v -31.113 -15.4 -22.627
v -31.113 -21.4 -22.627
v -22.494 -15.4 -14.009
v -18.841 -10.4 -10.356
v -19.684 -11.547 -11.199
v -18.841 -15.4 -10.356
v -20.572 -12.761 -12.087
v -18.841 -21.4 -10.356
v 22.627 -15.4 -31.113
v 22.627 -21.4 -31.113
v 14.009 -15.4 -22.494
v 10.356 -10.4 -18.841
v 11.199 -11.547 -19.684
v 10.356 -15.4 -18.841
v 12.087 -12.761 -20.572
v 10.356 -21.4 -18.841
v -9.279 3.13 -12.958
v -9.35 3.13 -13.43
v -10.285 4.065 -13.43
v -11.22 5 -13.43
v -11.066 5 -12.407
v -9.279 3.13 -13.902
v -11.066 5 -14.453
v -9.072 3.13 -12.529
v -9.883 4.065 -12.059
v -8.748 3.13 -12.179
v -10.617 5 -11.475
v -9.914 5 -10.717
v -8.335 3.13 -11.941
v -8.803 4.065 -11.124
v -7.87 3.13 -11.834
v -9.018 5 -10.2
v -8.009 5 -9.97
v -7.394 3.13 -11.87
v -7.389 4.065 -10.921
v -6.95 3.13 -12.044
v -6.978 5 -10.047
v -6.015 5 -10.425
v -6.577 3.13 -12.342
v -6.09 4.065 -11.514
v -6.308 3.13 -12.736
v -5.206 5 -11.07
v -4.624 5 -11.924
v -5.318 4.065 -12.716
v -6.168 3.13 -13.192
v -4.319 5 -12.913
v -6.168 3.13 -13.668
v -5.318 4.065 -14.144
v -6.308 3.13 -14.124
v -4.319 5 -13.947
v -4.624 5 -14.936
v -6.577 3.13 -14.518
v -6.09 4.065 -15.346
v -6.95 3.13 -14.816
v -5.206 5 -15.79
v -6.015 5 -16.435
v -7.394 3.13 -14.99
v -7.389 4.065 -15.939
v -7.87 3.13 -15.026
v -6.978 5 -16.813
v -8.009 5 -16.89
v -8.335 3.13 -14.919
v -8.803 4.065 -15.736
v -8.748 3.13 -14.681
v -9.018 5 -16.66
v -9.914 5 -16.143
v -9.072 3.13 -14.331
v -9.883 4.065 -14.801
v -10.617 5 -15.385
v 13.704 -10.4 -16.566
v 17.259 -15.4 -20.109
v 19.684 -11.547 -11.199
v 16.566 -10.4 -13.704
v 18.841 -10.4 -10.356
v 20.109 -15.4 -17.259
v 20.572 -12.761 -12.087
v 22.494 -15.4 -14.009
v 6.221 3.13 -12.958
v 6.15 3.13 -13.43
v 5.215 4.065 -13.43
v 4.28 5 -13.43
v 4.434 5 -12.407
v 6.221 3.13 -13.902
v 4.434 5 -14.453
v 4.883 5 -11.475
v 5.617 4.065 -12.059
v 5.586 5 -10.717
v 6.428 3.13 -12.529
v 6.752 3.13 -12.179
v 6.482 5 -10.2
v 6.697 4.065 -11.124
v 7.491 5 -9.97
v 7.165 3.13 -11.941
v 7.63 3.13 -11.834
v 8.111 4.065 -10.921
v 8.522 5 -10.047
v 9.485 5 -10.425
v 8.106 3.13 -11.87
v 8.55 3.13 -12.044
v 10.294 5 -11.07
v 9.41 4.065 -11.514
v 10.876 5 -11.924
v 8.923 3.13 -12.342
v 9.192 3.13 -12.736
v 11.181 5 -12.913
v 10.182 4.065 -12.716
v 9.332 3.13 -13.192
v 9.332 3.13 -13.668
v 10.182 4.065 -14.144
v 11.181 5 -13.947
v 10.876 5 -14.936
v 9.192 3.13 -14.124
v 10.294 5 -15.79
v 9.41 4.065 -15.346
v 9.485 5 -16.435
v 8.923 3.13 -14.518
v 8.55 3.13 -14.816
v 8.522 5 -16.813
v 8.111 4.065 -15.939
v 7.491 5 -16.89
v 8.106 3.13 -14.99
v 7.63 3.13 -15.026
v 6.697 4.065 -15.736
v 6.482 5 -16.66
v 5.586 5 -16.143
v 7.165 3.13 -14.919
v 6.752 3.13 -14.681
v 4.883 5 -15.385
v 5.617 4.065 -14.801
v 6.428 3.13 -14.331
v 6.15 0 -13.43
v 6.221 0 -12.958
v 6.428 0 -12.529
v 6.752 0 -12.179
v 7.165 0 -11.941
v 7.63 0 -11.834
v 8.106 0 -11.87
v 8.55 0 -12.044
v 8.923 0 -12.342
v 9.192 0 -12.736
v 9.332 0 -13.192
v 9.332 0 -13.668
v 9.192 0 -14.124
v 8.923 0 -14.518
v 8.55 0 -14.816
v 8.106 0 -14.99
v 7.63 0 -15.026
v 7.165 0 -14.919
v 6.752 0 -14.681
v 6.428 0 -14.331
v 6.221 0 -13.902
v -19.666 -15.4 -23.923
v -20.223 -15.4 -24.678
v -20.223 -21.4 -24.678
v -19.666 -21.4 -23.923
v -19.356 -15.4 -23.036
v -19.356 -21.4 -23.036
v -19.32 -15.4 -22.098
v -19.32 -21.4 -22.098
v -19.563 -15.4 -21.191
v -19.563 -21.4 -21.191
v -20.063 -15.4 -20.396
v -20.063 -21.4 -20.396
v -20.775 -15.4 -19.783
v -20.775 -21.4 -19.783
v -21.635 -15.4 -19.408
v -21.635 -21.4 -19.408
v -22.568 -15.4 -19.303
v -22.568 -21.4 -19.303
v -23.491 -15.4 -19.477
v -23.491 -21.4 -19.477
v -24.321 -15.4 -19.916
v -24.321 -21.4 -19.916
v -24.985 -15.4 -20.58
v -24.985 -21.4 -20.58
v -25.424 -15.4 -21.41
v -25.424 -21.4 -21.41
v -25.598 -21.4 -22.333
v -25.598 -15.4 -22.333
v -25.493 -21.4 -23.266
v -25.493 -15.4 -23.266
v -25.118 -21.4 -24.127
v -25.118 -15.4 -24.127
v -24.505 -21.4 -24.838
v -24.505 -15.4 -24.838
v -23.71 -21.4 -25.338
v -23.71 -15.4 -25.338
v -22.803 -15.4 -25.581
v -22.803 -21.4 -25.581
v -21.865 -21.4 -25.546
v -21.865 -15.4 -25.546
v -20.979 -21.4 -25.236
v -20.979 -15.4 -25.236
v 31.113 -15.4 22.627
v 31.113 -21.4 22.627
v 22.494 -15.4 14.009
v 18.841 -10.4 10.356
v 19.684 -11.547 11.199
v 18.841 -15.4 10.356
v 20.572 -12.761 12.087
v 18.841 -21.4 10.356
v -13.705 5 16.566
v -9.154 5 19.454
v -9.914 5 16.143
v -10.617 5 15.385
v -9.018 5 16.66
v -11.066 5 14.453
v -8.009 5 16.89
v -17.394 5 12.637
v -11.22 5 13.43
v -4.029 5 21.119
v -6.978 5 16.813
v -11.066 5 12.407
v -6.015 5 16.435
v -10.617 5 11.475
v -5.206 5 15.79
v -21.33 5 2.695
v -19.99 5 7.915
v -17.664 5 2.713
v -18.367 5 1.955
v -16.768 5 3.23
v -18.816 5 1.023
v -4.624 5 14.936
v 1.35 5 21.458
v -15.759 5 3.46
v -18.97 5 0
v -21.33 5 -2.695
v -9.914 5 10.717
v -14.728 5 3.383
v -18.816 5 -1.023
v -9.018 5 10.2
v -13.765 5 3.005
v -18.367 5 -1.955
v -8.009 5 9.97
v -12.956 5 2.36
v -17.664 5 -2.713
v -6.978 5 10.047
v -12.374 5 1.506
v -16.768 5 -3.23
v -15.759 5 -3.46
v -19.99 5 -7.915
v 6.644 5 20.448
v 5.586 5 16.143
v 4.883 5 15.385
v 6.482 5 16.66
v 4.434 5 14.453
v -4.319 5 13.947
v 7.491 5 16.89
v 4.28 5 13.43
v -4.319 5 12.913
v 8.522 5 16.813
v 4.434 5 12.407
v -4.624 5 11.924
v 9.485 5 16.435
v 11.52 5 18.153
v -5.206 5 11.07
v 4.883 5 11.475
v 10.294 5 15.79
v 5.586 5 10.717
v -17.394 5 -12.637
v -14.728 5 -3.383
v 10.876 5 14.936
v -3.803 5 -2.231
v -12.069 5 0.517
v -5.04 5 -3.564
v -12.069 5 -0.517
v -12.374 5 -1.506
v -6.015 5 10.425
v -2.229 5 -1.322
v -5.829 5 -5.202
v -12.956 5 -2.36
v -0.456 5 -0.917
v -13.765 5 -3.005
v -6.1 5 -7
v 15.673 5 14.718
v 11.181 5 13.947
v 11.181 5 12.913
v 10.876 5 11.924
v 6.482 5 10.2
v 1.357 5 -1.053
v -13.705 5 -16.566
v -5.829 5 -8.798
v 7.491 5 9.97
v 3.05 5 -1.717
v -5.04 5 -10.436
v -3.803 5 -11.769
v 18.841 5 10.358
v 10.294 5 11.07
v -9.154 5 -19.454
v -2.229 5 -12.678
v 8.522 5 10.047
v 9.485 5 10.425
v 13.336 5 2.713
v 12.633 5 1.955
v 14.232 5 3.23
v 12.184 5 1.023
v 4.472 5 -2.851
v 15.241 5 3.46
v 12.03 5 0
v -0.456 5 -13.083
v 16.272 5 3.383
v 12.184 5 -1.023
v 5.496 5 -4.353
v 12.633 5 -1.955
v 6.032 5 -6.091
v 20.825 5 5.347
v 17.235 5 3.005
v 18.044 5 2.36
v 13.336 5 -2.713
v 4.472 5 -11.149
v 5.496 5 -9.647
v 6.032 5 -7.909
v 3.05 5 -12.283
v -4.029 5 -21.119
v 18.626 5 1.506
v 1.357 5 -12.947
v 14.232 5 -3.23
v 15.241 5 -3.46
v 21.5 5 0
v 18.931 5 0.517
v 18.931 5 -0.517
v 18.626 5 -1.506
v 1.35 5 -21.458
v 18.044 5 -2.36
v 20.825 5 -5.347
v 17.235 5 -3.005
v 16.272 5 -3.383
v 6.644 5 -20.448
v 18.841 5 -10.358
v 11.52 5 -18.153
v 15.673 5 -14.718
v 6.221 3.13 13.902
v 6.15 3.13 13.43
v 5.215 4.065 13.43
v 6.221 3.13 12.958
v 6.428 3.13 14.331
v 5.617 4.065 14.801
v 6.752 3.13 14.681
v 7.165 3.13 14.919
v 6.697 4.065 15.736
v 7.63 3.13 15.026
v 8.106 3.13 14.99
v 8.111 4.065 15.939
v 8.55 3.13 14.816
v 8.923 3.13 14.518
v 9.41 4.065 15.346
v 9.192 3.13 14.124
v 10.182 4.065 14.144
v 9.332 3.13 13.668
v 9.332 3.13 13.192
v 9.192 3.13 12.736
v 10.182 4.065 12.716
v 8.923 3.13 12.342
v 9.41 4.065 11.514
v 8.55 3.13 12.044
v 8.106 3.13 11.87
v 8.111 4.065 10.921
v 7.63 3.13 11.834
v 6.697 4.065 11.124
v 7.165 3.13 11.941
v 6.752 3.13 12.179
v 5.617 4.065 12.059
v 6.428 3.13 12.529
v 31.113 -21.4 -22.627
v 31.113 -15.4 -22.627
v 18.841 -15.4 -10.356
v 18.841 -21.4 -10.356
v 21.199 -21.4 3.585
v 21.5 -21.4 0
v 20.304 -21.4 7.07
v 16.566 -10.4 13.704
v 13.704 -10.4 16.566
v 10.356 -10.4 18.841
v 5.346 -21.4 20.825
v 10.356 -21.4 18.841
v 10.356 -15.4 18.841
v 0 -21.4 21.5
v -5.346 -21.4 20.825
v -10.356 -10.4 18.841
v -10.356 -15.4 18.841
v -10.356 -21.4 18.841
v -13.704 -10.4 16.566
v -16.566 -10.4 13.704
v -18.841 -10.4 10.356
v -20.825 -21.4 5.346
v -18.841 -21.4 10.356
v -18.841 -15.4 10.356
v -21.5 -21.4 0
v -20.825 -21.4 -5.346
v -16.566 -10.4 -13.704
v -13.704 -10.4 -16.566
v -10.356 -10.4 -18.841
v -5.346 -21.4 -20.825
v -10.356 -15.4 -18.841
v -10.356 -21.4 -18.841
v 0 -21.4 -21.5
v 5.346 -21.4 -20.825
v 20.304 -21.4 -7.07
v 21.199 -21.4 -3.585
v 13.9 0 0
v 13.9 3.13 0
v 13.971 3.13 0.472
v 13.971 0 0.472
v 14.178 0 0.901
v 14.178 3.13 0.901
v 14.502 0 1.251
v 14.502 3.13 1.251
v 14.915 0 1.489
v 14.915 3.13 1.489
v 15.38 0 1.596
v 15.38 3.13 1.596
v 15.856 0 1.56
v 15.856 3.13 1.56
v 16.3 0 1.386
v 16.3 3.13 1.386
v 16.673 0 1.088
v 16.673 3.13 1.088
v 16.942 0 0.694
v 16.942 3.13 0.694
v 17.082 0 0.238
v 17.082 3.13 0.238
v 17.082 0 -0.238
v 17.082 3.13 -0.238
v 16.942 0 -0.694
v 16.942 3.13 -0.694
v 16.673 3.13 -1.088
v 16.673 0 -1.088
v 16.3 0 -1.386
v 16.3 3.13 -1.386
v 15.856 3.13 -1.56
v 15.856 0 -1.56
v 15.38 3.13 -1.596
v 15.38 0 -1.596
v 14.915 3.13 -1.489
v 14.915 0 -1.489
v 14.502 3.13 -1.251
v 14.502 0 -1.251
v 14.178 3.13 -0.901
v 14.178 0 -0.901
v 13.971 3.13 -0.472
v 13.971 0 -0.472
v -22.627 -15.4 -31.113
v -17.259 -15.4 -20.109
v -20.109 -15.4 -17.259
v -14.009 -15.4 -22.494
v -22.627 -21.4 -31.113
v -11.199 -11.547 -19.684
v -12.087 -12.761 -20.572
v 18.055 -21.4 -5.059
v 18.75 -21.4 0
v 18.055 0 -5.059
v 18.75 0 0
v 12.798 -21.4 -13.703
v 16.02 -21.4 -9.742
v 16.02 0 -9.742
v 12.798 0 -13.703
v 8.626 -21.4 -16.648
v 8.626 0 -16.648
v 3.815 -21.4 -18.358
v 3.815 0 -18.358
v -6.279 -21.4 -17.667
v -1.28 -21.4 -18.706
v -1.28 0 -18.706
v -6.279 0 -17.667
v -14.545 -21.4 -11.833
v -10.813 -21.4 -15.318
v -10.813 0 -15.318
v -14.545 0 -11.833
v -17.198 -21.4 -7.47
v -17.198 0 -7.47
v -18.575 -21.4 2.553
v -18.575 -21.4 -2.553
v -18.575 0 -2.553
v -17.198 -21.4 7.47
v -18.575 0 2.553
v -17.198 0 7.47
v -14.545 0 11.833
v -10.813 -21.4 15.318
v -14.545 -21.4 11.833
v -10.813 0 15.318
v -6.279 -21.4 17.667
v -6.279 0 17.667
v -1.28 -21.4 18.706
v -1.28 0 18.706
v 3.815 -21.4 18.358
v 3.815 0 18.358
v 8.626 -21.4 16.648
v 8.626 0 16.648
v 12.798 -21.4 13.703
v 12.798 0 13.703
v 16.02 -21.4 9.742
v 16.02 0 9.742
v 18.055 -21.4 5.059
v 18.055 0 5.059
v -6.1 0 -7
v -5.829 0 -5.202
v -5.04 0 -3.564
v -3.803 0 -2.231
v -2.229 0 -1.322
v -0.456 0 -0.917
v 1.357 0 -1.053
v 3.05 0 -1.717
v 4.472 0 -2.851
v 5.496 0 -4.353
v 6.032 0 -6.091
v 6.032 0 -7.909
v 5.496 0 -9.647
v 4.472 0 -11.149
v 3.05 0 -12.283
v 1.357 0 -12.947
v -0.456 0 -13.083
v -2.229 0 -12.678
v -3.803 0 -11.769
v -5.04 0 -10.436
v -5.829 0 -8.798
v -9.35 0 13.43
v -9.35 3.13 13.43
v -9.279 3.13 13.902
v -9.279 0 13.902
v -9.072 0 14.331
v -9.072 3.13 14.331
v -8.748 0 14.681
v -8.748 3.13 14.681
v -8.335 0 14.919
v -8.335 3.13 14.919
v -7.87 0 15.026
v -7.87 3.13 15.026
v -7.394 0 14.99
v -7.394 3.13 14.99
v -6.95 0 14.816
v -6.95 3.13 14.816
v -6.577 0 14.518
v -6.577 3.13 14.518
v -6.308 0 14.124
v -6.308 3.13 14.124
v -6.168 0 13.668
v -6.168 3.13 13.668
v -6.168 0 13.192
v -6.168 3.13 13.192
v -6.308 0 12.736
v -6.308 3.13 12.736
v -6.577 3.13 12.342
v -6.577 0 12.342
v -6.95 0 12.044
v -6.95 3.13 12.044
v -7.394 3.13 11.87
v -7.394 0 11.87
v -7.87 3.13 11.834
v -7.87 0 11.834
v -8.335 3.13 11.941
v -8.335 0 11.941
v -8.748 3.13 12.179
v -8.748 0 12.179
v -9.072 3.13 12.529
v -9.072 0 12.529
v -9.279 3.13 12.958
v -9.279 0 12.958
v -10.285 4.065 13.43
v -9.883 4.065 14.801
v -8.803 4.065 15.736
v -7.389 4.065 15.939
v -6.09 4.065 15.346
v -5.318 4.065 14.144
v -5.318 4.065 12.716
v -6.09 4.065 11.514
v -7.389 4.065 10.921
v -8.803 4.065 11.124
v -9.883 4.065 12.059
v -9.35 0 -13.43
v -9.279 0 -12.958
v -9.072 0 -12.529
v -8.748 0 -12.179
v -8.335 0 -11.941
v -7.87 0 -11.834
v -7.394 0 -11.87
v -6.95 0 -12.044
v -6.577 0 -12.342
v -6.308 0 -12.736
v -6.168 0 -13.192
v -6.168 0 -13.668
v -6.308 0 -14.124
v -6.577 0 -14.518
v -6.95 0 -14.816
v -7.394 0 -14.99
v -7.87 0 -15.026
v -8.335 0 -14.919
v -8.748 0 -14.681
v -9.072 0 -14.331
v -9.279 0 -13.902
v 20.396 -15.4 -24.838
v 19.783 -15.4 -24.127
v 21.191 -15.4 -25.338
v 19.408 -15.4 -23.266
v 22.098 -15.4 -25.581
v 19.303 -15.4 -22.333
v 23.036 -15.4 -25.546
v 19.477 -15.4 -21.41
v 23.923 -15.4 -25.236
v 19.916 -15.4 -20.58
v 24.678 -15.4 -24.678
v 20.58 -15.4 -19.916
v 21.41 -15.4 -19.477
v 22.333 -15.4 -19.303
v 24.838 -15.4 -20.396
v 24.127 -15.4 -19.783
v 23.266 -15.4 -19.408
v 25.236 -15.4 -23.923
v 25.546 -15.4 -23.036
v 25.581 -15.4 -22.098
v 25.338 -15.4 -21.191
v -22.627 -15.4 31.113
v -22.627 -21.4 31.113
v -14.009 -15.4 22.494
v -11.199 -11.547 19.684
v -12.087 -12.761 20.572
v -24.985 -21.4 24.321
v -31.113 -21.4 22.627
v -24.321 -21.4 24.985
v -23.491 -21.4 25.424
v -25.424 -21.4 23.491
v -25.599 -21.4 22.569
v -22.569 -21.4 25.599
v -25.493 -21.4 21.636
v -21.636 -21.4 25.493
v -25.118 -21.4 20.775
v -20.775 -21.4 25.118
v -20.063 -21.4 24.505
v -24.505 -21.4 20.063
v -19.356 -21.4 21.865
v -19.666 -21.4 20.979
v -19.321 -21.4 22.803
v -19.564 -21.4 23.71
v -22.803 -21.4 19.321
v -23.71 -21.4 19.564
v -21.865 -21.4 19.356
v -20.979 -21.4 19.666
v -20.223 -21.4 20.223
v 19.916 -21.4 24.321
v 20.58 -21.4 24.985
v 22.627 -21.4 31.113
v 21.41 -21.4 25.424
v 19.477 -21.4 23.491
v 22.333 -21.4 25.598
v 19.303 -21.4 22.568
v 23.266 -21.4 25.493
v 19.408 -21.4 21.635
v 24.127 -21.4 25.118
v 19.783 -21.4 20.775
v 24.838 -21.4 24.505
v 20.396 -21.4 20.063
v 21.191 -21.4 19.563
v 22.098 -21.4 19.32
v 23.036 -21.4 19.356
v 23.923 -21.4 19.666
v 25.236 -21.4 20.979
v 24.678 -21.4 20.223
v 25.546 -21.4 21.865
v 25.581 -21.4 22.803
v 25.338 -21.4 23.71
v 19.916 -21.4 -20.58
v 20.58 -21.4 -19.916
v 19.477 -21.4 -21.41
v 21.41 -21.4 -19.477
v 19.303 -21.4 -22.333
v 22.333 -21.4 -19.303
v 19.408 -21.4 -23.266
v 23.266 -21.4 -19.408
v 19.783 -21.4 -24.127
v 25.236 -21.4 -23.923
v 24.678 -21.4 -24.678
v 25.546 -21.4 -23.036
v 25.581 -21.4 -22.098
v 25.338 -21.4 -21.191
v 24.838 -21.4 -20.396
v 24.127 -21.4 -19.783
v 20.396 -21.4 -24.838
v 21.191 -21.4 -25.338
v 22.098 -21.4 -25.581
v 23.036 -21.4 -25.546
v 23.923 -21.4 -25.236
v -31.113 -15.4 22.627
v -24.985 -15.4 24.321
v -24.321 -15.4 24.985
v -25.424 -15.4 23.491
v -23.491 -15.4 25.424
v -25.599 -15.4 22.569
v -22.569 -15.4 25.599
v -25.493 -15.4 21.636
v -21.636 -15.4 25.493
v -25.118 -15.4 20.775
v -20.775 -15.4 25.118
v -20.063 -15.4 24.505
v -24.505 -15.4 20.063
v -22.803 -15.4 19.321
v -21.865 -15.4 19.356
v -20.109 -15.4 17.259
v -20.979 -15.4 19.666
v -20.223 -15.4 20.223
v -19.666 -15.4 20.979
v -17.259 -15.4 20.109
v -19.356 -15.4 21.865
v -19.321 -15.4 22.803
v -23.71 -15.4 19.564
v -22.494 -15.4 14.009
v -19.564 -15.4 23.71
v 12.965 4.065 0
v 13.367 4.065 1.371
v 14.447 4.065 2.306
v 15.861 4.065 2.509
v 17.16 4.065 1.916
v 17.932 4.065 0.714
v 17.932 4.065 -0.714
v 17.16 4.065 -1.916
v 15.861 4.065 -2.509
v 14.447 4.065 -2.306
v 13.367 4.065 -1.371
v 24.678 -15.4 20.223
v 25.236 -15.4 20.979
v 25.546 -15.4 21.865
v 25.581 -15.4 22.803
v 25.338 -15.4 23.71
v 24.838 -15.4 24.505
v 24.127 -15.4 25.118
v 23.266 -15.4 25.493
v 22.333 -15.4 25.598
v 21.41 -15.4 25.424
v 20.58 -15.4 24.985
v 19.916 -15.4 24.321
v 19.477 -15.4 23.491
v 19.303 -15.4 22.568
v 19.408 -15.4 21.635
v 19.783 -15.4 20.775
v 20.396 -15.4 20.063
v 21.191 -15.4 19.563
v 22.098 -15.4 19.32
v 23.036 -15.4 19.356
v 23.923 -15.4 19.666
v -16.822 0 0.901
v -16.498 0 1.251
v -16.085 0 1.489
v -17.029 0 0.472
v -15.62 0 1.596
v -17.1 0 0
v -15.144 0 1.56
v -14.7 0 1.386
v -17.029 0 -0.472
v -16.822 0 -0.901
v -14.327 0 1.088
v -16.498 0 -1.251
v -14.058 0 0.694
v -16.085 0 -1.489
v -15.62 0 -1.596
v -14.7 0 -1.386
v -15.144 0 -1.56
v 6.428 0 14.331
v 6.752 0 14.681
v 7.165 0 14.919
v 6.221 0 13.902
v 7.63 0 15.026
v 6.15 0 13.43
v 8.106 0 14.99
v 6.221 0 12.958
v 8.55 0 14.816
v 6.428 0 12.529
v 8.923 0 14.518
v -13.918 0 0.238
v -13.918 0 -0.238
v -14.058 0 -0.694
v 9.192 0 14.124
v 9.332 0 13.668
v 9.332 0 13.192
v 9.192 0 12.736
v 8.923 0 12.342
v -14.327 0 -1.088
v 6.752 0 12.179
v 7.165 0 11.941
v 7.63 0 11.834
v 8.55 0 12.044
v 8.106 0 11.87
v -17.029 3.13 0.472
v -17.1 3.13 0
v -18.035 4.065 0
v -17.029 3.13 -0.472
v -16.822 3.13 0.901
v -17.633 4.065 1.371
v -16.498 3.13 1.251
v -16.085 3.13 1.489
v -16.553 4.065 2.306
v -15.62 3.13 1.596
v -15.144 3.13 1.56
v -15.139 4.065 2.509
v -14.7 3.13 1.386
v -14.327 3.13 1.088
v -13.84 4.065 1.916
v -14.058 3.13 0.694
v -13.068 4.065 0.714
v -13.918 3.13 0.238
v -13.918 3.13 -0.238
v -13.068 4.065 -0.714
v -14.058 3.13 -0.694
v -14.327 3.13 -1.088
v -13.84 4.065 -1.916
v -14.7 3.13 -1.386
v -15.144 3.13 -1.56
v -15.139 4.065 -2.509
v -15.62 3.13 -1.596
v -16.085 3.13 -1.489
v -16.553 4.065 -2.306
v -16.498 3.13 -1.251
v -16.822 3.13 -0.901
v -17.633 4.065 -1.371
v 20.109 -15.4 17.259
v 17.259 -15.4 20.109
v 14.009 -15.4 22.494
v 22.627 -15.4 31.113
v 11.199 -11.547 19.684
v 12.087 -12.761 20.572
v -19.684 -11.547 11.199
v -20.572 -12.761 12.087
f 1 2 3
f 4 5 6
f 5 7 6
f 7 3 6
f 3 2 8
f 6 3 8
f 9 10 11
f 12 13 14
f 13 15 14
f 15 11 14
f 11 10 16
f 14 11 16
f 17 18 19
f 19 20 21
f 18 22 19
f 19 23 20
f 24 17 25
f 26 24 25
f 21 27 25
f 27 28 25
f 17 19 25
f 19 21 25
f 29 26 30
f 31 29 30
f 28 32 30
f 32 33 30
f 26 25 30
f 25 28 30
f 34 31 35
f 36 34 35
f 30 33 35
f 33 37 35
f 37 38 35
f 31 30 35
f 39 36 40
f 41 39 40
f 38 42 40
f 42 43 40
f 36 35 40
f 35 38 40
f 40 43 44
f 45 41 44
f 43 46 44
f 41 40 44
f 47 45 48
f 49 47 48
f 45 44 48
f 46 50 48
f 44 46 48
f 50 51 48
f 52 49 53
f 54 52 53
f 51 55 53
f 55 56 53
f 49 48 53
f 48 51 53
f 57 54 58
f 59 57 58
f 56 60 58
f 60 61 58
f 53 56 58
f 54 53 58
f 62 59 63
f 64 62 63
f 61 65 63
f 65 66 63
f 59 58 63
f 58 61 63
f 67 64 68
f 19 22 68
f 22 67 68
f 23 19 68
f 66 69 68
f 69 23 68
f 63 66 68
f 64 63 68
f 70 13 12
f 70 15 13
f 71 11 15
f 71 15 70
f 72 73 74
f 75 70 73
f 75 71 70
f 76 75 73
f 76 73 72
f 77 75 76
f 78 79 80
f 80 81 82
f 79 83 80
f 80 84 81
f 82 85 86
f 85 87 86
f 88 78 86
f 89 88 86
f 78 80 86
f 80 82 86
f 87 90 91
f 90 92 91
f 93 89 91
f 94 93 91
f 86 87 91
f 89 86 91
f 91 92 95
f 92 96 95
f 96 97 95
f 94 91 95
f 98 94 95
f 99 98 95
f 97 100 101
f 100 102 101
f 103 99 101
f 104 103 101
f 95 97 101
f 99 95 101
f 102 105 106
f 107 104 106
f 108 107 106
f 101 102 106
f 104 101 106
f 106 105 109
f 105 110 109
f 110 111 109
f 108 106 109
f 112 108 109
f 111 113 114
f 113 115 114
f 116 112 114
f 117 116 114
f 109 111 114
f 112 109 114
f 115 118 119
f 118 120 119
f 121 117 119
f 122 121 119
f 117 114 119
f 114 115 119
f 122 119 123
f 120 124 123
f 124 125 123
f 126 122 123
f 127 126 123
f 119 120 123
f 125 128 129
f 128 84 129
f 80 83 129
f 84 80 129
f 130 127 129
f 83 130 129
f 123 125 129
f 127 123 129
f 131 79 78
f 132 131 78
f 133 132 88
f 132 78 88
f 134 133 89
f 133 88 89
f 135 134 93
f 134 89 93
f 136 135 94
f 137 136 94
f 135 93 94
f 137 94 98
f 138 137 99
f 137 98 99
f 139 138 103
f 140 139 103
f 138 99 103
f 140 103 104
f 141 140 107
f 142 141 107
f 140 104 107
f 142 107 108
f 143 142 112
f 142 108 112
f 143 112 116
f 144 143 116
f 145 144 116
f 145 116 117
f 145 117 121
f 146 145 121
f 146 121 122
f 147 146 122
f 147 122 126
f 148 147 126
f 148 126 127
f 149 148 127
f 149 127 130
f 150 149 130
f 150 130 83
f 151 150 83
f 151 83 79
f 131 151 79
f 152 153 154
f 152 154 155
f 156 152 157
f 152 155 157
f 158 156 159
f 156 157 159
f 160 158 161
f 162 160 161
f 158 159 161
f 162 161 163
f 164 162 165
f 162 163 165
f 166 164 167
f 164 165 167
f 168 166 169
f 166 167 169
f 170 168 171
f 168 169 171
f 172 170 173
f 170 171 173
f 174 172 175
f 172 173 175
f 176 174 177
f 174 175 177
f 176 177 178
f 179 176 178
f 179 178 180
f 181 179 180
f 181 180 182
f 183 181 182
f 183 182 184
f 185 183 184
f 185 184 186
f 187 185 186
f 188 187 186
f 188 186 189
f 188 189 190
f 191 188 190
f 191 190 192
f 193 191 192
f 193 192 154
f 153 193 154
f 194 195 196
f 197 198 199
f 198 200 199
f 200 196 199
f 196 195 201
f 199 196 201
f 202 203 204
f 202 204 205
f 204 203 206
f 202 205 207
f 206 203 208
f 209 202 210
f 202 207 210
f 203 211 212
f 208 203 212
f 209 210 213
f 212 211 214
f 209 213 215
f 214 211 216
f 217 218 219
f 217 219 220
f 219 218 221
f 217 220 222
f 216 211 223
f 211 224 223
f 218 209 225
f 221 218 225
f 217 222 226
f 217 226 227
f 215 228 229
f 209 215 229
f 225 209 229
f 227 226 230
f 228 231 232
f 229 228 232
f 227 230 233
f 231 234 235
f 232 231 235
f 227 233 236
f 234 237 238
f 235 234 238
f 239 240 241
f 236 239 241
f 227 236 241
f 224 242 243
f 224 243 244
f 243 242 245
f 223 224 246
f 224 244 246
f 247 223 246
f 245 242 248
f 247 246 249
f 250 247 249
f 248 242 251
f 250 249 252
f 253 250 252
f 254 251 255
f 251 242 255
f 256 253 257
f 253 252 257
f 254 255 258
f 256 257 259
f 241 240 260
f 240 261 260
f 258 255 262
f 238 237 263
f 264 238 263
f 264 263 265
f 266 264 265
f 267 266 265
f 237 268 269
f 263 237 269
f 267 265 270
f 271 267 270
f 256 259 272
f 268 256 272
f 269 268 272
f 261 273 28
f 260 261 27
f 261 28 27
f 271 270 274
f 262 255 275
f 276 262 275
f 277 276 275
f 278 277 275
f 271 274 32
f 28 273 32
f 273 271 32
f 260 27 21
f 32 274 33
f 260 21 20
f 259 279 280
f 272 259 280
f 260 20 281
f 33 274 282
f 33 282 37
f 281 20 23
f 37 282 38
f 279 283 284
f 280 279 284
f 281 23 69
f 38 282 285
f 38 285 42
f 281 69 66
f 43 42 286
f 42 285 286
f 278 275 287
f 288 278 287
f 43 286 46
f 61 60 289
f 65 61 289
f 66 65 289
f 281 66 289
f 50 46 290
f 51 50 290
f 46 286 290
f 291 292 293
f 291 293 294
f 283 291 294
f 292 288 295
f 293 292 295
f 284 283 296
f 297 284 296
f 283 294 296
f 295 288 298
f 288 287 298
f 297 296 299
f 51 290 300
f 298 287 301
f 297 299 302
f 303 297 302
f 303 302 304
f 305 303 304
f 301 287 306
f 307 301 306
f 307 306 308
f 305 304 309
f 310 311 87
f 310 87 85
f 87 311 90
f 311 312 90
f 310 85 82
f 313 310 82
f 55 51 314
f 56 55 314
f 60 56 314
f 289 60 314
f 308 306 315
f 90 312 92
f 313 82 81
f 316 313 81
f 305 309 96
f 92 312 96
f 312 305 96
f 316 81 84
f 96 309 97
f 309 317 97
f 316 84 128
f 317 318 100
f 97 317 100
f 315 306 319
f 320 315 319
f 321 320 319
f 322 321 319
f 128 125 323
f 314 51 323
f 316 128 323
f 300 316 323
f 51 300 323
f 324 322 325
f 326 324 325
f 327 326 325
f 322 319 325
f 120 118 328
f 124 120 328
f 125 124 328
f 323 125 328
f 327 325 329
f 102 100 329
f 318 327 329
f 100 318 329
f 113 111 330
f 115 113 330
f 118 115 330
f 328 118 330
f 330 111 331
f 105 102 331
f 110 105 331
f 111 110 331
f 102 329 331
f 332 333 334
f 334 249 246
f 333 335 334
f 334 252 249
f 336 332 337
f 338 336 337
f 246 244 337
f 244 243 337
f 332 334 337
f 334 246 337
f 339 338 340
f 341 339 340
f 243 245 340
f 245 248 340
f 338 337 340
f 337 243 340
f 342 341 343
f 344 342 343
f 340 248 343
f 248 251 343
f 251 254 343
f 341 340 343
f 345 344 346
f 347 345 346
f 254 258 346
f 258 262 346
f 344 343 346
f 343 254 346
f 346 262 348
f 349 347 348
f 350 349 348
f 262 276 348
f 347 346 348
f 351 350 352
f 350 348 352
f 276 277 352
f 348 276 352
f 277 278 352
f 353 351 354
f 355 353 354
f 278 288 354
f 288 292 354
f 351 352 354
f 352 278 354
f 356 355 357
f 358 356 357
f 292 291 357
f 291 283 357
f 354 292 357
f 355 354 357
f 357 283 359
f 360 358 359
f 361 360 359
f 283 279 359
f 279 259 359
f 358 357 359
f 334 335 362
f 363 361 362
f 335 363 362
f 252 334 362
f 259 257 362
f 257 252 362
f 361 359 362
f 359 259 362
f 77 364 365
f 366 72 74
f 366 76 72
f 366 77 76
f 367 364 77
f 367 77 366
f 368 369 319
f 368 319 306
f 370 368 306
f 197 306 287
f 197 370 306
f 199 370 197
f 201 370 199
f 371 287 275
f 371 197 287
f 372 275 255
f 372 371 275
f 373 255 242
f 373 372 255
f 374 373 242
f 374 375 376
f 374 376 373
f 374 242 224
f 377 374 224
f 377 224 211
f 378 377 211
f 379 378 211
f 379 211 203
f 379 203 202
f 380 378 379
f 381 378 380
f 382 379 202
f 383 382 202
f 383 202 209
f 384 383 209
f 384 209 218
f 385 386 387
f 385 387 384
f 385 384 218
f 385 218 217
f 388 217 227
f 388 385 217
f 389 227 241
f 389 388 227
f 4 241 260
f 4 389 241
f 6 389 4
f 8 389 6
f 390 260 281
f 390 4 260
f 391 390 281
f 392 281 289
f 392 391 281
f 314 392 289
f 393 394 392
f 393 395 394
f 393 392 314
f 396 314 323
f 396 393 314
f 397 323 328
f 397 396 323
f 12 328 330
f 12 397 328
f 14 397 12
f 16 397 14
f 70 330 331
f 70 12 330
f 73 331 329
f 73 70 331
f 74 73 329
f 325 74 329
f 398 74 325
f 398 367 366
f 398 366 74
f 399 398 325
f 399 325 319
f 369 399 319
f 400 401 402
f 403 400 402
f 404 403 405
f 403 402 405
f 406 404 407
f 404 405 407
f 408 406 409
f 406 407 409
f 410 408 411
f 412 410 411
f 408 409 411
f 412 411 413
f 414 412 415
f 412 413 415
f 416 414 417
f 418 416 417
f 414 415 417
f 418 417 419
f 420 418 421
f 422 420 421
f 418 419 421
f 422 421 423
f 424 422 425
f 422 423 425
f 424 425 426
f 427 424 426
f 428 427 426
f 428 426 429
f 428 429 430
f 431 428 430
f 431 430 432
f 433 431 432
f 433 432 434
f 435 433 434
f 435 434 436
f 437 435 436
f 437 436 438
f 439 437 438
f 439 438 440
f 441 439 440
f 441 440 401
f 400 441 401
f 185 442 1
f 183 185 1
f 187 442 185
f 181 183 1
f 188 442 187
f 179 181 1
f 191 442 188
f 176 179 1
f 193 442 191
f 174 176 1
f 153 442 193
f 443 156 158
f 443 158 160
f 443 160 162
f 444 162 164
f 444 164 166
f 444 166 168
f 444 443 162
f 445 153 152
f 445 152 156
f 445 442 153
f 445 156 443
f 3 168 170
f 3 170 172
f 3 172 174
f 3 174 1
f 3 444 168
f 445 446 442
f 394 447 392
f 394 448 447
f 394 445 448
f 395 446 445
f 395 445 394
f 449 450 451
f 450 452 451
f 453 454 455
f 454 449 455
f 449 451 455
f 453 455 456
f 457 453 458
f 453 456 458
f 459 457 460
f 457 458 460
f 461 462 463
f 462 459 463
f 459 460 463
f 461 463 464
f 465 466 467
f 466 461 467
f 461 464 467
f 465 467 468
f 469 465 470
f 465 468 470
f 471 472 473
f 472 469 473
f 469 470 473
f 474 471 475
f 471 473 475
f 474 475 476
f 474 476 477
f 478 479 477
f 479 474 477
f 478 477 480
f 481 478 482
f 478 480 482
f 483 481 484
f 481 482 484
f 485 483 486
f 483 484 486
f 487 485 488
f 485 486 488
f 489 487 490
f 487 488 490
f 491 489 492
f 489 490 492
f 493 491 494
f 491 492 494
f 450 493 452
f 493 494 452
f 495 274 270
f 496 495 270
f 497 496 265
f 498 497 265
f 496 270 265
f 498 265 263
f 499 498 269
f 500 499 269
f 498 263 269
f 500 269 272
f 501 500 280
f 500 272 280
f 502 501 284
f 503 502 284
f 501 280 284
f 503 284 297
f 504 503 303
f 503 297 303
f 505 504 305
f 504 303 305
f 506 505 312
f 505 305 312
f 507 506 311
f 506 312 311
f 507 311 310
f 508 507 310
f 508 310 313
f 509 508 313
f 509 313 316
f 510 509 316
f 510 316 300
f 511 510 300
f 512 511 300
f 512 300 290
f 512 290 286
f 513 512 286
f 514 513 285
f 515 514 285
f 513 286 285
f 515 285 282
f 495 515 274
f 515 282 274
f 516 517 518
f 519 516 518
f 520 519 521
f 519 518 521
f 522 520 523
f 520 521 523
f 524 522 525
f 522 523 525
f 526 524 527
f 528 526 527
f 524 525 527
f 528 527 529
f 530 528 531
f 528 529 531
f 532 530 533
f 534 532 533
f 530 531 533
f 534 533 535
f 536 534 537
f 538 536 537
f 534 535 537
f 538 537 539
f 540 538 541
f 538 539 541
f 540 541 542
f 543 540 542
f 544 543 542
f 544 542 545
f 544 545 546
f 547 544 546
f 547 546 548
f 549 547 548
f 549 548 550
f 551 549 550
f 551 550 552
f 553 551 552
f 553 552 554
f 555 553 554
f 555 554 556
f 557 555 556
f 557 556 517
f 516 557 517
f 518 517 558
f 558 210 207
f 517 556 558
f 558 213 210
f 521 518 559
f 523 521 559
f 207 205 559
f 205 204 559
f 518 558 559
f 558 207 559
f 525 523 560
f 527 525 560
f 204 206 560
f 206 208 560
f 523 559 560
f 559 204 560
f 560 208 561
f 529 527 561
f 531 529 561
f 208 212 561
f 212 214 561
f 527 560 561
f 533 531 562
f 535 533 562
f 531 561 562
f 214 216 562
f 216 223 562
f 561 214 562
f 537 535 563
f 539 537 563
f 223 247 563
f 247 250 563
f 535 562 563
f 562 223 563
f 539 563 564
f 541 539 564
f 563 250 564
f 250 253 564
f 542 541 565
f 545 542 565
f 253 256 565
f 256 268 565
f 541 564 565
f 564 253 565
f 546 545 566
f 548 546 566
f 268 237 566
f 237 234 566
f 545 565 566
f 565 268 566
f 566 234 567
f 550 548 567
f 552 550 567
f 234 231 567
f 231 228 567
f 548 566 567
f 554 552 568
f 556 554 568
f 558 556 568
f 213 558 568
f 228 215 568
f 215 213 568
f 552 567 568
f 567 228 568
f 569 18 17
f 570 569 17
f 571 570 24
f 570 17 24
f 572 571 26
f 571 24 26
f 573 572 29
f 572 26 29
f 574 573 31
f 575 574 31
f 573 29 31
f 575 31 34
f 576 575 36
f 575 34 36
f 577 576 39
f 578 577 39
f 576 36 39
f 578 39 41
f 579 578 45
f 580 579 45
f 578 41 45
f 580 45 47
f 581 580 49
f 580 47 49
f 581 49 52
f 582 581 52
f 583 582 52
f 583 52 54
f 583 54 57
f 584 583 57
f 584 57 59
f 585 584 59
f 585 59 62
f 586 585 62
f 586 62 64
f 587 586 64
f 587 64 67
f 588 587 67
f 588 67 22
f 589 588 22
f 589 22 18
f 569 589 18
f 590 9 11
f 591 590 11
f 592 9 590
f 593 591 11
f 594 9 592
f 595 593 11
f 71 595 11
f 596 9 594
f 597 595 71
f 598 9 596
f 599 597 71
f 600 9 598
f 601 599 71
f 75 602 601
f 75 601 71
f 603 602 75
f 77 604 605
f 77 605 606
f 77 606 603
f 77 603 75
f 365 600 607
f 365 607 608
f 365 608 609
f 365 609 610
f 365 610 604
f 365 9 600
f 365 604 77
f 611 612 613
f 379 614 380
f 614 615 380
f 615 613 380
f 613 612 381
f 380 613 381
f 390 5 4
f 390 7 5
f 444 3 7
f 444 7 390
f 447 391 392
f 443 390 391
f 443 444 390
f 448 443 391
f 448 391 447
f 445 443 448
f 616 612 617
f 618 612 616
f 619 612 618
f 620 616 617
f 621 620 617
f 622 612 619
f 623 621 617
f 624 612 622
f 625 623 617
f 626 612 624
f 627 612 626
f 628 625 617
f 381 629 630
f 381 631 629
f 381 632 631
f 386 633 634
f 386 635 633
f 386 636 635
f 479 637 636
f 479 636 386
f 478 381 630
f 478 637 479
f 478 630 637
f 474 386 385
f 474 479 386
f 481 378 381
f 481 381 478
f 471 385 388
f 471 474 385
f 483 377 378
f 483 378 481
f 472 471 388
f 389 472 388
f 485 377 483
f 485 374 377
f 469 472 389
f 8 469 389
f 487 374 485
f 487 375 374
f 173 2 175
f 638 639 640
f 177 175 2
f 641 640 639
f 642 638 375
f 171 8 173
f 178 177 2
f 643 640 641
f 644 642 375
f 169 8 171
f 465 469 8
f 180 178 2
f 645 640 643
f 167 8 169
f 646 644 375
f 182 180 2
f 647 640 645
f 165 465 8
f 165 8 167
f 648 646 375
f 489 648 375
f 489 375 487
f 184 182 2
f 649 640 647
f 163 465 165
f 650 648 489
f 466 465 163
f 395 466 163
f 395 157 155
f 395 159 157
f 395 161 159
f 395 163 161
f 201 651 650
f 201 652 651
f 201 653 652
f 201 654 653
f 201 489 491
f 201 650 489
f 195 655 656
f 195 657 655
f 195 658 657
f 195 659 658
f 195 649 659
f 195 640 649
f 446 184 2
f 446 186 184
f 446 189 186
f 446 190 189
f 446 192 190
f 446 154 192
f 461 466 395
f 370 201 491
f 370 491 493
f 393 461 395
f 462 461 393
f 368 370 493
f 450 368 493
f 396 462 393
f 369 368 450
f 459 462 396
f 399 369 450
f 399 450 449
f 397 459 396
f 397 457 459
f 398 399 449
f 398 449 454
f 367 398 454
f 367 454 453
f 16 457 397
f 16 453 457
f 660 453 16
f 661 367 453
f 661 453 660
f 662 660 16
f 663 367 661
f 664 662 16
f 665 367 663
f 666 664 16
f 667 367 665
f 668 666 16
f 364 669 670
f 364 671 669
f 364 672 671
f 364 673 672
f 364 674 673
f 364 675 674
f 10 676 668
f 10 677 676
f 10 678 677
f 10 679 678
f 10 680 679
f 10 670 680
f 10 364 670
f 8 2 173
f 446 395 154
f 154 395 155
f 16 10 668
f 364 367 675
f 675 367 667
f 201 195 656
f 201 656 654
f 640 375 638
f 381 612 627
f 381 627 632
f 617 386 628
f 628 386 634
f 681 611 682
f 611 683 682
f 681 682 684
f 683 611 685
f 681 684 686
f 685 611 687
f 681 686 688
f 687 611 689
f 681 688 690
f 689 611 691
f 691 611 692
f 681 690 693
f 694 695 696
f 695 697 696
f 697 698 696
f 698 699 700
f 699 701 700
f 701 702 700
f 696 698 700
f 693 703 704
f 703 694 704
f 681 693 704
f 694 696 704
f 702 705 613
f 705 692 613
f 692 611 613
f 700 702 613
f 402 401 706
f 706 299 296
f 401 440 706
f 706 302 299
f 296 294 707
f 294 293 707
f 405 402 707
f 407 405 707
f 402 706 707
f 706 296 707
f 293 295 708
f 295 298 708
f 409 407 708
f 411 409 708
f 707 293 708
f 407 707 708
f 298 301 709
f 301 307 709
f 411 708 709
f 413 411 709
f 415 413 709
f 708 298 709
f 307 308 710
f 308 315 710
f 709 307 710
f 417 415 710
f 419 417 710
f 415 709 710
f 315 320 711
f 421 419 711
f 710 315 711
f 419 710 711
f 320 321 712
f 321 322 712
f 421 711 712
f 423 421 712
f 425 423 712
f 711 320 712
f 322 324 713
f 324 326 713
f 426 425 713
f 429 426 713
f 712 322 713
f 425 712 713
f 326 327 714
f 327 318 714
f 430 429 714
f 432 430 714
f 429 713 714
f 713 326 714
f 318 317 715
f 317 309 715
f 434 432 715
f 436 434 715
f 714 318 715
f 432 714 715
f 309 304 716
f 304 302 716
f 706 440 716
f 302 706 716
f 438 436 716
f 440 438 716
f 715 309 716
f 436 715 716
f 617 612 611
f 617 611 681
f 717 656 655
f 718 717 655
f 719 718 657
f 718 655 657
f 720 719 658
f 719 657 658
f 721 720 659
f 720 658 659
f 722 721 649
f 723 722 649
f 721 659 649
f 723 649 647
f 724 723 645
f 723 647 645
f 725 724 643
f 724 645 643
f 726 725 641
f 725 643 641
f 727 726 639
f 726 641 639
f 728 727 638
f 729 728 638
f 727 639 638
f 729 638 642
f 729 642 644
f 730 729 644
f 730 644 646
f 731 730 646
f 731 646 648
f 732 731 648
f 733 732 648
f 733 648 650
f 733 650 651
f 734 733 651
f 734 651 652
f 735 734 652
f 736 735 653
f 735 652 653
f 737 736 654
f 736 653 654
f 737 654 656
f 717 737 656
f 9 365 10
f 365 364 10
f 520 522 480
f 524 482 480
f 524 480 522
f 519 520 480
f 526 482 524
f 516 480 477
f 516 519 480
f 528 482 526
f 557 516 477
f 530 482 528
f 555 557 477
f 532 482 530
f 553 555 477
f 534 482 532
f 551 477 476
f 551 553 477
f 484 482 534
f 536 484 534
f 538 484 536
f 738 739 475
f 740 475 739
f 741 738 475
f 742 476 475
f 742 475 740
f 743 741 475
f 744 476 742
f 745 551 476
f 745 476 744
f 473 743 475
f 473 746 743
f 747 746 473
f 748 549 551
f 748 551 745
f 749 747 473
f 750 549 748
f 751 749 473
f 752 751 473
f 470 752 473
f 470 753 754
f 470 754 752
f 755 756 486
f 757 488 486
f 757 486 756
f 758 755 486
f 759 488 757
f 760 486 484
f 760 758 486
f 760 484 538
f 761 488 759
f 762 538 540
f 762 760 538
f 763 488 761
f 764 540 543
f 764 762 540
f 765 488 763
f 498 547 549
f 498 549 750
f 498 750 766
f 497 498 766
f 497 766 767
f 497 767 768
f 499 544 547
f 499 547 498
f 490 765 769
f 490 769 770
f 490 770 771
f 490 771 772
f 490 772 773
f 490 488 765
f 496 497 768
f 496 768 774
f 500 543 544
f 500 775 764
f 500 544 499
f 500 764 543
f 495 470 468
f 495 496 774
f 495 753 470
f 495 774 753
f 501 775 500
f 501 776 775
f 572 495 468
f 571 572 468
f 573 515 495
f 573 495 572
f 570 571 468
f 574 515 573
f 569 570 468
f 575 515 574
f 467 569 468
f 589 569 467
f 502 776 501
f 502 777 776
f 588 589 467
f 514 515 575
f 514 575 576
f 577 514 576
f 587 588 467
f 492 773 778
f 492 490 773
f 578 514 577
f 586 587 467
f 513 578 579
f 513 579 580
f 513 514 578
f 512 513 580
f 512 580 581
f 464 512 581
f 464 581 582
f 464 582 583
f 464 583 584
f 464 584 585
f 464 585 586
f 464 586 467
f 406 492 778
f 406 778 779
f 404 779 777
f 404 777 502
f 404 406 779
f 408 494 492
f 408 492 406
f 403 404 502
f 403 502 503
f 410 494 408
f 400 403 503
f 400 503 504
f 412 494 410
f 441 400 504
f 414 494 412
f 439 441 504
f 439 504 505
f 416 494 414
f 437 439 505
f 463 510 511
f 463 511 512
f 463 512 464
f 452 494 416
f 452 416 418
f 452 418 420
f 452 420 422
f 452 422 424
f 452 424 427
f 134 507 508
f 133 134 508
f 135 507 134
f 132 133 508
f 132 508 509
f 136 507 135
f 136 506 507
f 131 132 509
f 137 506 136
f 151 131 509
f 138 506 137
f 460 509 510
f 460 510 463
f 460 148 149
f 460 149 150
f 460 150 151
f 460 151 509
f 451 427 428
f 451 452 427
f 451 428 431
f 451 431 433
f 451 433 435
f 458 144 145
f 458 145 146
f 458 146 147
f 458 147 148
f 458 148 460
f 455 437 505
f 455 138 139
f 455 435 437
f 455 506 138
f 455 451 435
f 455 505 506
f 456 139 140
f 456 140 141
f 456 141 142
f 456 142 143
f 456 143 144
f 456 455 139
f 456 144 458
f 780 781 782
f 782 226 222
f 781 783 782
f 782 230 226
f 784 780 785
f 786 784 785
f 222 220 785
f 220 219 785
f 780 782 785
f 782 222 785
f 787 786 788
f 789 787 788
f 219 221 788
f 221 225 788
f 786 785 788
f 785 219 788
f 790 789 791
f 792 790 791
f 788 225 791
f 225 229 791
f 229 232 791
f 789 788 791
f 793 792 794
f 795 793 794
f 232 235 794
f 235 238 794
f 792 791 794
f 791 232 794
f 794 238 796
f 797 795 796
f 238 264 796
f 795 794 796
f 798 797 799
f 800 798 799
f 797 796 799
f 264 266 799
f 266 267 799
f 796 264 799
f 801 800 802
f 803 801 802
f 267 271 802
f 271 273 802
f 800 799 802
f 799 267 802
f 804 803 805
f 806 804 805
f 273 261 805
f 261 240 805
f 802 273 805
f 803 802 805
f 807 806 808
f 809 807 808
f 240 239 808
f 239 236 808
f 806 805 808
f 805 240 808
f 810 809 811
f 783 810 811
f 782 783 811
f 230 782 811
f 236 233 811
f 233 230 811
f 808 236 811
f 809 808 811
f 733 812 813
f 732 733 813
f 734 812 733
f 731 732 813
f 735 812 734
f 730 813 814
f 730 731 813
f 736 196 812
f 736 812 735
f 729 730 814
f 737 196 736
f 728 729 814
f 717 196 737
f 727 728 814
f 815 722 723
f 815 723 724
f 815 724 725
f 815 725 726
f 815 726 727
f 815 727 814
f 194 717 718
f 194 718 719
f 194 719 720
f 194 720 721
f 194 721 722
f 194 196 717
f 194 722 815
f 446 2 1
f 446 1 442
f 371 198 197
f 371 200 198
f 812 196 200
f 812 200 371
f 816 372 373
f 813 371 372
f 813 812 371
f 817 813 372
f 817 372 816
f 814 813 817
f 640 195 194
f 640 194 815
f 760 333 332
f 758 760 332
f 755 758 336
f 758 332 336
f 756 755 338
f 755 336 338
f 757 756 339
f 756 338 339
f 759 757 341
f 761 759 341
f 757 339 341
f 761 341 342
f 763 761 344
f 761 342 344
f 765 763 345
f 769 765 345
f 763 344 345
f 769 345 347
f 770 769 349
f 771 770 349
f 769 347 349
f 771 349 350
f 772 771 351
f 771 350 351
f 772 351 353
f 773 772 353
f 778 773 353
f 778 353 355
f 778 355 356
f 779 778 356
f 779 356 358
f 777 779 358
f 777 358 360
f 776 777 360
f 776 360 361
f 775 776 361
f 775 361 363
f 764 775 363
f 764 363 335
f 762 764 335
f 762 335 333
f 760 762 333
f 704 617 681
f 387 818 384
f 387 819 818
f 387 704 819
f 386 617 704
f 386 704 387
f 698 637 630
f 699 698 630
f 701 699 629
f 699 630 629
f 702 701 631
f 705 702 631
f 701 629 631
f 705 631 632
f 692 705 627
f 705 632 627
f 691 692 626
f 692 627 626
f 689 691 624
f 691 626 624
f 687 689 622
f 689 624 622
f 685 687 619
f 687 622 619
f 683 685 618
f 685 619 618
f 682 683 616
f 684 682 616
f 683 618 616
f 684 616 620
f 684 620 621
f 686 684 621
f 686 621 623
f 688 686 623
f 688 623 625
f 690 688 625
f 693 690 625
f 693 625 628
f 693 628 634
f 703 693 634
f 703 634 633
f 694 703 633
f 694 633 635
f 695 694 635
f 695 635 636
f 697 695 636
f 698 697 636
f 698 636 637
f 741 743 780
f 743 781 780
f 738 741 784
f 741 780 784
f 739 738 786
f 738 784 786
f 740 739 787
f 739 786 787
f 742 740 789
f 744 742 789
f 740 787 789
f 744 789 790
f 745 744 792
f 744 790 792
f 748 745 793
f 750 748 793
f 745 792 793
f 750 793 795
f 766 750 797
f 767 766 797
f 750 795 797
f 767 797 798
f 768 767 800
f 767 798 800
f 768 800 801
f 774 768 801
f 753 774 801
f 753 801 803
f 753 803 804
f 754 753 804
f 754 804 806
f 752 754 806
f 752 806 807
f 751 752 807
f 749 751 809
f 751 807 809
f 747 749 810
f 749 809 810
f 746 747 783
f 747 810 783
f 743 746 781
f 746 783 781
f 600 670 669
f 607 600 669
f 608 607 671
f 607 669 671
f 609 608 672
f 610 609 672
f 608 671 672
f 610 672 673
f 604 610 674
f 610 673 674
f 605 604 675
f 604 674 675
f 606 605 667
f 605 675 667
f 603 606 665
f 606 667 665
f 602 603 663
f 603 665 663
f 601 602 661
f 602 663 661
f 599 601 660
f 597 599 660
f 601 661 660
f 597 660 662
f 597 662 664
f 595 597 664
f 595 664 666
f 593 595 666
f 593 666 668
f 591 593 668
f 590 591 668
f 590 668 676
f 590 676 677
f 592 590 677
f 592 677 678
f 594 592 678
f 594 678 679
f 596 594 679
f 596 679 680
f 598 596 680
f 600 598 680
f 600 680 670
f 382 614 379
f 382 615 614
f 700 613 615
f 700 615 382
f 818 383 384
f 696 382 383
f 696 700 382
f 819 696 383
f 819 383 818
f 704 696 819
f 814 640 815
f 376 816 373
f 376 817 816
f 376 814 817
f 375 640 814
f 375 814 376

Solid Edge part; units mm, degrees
sketch "Sketch1" plane through (0, 0, 0) normal (0, -1, 0) x (1, 0, 0)
  circle A0 centre (0, 0) radius 21.5
extrude "Protrusion1" add sketch "Sketch1" against normal blind 5
sketch "Sketch2" plane through (0, 0, 0) normal (0, -1, 0) x (1, 0, 0)
  circle A0 centre (0, 0) radius 21.5
  circle A1 centre (0, 0) radius 18.75
  dimension "D1" = 43
  dimension "D2" = 37.5
extrude "ExtrudedProtrusion_2" add sketch "Sketch2" along normal blind 21.4
sketch "Sketch3" plane through (0, -21.4, 0) normal (0, -1, 0) x (1, 0, 0)
  line L0 (-31.1127, 22.6274) -> (-18.8414, 10.3562)
  arc A0 (-18.8414, 10.3562) -> (-10.3562, 18.8414) centre (0, 0) cw
  line L1 (-22.6274, 31.1127) -> (-10.3562, 18.8414)
  line L2 (-22.6274, 31.1127) -> (-31.1127, 22.6274)
  line L3 (-31.1127, -22.6274) -> (-18.8414, -10.3562)
  arc A1 (-10.3562, -18.8414) -> (-18.8414, -10.3562) centre (0, 0) cw
  line L4 (-22.6274, -31.1127) -> (-10.3562, -18.8414)
  line L5 (-31.1127, -22.6274) -> (-22.6274, -31.1127)
  line L6 (22.6274, -31.1127) -> (10.3562, -18.8414)
  arc A2 (18.8414, -10.3562) -> (10.3562, -18.8414) centre (0, 0) cw
  line L7 (31.1127, -22.6274) -> (18.8414, -10.3562)
  line L8 (31.1127, -22.6274) -> (22.6274, -31.1127)
  line L9 (31.1127, 22.6274) -> (18.8414, 10.3562)
  line L10 (22.6274, 31.1127) -> (10.3562, 18.8414)
  line L11 (31.1127, 22.6274) -> (22.6274, 31.1127)
  arc A3 (10.3562, 18.8414) -> (18.8414, 10.3562) centre (0, 0) cw
extrude "ExtrudedProtrusion_3" add sketch "Sketch3" against normal blind 6
sketch "Sketch4" plane through (0, -21.4, 0) normal (0, -1, 0) x (0.7071, 0, -0.7071)
  circle A0 centre (-31.7502, 0) radius 3.15
  circle A1 centre (0, 31.75) radius 3.15
  circle A2 centre (31.75, 0) radius 3.15
  circle A3 centre (0, -31.75) radius 3.15
  dimension "D1" = 6.3
  dimension "D2" = 6.3
  dimension "D3" = 6.3
  dimension "D4" = 6.3
  dimension "D5" = 6.2498
  dimension "D6" = 6.25
  dimension "D7" = 6.25
  dimension "D8" = 6.25
extrude "Cutout1" cut sketch "Sketch4" against normal up to next
sketch "Sketch5" plane through (0, 5, 0) normal (0, 1, 0) x (-1, 0, 0)
  circle A0 centre (7.75, 13.43) radius 1.6
  circle A1 centre (-7.75, 13.43) radius 1.6
  circle A2 centre (-15.5, 0) radius 1.6
  circle A3 centre (15.5, 0) radius 1.6
  circle A4 centre (7.75, -13.43) radius 1.6
  circle A5 centre (-7.75, -13.43) radius 1.6
  circle A6 centre (0, -7) radius 6.1
  dimension "D1" = 12.2
  dimension "D2" = 7
  dimension "D3" = 3.2
  dimension "D4" = 15.5
  dimension "D5" = 31
  dimension "D6" = 15.5
  dimension "D7" = 13.43
  dimension "D8" = 7.75
  dimension "D9" = 3.2
  dimension "D10" = 3.2
  dimension "D11" = 13.43
extrude "Cutout2" cut sketch "Sketch5" against normal up to next
chamfer "Chamfer_1" distance 1.87 angle 45 6 edges at (17.1, 5, 0) (9.35, 5, 13.43) (-6.15, 5, 13.43) (-13.9, 5, 0) (-6.15, 5, -13.43) (9.35, 5, -13.43)
chamfer "Chamfer_2" distance 5 angle 45 4 edges at (-15.2028, -15.4, -15.2028) (15.2028, -15.4, -15.2028) (15.2028, -15.4, 15.2028) (-15.2028, -15.4, 15.2028)
